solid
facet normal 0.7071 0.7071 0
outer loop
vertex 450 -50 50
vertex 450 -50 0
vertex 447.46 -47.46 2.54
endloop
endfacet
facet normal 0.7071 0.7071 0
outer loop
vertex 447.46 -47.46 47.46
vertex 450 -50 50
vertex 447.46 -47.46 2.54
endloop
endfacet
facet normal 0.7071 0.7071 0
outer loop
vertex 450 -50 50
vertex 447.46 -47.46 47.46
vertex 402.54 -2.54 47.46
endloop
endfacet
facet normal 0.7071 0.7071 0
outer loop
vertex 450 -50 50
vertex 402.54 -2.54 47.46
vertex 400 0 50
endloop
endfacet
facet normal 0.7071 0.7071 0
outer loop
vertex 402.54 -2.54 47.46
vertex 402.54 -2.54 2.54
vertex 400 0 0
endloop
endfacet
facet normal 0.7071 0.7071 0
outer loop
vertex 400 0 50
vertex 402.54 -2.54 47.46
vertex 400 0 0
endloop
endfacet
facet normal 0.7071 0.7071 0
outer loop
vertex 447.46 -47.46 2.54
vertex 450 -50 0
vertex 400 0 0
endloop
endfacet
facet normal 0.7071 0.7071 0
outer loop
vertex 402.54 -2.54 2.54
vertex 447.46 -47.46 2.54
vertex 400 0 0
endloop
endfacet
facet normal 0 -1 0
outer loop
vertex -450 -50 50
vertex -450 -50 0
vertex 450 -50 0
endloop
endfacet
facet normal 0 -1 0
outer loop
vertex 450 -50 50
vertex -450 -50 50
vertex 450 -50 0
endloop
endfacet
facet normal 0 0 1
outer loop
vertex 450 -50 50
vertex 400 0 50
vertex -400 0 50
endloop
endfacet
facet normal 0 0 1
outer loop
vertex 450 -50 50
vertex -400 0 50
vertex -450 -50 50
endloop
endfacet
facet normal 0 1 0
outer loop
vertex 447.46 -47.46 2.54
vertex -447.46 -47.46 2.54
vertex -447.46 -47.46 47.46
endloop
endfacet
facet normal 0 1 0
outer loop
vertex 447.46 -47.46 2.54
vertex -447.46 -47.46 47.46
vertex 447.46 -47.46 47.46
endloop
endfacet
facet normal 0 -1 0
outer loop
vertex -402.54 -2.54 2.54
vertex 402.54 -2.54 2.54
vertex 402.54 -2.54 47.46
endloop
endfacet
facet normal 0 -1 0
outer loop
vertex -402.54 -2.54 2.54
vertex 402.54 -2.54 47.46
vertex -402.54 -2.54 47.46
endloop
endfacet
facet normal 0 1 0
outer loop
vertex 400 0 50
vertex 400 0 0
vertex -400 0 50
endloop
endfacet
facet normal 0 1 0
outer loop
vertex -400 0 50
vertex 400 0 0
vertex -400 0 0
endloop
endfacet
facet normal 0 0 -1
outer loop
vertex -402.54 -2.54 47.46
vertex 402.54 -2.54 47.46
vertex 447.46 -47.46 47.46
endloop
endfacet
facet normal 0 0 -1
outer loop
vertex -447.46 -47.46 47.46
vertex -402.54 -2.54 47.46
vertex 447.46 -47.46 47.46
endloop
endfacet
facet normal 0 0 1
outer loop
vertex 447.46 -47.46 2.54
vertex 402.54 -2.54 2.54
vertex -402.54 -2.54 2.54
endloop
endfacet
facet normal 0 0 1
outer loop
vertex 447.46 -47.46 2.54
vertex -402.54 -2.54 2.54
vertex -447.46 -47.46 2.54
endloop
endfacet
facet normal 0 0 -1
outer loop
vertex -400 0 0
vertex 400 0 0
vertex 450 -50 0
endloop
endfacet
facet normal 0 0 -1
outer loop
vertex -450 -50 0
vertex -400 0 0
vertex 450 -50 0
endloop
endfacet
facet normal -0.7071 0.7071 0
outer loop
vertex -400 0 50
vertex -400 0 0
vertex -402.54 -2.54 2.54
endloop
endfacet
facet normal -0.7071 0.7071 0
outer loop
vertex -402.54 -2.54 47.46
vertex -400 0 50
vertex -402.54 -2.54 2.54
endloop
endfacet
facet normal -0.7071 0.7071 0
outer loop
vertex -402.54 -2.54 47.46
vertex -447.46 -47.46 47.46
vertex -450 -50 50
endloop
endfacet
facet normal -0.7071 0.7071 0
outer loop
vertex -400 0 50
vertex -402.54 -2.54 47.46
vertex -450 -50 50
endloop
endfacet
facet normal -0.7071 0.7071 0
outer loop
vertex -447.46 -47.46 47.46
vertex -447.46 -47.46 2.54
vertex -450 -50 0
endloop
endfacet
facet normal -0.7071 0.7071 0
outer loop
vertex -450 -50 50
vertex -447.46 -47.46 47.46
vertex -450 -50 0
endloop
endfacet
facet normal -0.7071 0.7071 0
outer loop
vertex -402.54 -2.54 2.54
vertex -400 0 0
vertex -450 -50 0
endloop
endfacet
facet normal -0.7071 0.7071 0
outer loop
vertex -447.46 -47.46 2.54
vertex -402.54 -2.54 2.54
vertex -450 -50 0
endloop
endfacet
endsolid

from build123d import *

# Parameters (mm, degrees)
F1_DEPTH = 50
F2_T     = -2.54


with BuildPart() as f1:
    # F0 (on Top) → F1 (new body)
    with BuildSketch(Plane.XY):
        Polygon((400, 0), (0, 0), (0, -50), (450, -50), align=None)
        Polygon((0, -50), (0, 0), (-400, 0), (-450, -50), align=None)
    extrude(amount=F1_DEPTH)

    # F2
    f2_openings = [f1.faces().sort_by_distance(p)[0] for p in [
        (425, -25, 25),
        (-425, -25, 25),
    ]]
    offset(amount=F2_T, openings=f2_openings)


solid = f1.part
